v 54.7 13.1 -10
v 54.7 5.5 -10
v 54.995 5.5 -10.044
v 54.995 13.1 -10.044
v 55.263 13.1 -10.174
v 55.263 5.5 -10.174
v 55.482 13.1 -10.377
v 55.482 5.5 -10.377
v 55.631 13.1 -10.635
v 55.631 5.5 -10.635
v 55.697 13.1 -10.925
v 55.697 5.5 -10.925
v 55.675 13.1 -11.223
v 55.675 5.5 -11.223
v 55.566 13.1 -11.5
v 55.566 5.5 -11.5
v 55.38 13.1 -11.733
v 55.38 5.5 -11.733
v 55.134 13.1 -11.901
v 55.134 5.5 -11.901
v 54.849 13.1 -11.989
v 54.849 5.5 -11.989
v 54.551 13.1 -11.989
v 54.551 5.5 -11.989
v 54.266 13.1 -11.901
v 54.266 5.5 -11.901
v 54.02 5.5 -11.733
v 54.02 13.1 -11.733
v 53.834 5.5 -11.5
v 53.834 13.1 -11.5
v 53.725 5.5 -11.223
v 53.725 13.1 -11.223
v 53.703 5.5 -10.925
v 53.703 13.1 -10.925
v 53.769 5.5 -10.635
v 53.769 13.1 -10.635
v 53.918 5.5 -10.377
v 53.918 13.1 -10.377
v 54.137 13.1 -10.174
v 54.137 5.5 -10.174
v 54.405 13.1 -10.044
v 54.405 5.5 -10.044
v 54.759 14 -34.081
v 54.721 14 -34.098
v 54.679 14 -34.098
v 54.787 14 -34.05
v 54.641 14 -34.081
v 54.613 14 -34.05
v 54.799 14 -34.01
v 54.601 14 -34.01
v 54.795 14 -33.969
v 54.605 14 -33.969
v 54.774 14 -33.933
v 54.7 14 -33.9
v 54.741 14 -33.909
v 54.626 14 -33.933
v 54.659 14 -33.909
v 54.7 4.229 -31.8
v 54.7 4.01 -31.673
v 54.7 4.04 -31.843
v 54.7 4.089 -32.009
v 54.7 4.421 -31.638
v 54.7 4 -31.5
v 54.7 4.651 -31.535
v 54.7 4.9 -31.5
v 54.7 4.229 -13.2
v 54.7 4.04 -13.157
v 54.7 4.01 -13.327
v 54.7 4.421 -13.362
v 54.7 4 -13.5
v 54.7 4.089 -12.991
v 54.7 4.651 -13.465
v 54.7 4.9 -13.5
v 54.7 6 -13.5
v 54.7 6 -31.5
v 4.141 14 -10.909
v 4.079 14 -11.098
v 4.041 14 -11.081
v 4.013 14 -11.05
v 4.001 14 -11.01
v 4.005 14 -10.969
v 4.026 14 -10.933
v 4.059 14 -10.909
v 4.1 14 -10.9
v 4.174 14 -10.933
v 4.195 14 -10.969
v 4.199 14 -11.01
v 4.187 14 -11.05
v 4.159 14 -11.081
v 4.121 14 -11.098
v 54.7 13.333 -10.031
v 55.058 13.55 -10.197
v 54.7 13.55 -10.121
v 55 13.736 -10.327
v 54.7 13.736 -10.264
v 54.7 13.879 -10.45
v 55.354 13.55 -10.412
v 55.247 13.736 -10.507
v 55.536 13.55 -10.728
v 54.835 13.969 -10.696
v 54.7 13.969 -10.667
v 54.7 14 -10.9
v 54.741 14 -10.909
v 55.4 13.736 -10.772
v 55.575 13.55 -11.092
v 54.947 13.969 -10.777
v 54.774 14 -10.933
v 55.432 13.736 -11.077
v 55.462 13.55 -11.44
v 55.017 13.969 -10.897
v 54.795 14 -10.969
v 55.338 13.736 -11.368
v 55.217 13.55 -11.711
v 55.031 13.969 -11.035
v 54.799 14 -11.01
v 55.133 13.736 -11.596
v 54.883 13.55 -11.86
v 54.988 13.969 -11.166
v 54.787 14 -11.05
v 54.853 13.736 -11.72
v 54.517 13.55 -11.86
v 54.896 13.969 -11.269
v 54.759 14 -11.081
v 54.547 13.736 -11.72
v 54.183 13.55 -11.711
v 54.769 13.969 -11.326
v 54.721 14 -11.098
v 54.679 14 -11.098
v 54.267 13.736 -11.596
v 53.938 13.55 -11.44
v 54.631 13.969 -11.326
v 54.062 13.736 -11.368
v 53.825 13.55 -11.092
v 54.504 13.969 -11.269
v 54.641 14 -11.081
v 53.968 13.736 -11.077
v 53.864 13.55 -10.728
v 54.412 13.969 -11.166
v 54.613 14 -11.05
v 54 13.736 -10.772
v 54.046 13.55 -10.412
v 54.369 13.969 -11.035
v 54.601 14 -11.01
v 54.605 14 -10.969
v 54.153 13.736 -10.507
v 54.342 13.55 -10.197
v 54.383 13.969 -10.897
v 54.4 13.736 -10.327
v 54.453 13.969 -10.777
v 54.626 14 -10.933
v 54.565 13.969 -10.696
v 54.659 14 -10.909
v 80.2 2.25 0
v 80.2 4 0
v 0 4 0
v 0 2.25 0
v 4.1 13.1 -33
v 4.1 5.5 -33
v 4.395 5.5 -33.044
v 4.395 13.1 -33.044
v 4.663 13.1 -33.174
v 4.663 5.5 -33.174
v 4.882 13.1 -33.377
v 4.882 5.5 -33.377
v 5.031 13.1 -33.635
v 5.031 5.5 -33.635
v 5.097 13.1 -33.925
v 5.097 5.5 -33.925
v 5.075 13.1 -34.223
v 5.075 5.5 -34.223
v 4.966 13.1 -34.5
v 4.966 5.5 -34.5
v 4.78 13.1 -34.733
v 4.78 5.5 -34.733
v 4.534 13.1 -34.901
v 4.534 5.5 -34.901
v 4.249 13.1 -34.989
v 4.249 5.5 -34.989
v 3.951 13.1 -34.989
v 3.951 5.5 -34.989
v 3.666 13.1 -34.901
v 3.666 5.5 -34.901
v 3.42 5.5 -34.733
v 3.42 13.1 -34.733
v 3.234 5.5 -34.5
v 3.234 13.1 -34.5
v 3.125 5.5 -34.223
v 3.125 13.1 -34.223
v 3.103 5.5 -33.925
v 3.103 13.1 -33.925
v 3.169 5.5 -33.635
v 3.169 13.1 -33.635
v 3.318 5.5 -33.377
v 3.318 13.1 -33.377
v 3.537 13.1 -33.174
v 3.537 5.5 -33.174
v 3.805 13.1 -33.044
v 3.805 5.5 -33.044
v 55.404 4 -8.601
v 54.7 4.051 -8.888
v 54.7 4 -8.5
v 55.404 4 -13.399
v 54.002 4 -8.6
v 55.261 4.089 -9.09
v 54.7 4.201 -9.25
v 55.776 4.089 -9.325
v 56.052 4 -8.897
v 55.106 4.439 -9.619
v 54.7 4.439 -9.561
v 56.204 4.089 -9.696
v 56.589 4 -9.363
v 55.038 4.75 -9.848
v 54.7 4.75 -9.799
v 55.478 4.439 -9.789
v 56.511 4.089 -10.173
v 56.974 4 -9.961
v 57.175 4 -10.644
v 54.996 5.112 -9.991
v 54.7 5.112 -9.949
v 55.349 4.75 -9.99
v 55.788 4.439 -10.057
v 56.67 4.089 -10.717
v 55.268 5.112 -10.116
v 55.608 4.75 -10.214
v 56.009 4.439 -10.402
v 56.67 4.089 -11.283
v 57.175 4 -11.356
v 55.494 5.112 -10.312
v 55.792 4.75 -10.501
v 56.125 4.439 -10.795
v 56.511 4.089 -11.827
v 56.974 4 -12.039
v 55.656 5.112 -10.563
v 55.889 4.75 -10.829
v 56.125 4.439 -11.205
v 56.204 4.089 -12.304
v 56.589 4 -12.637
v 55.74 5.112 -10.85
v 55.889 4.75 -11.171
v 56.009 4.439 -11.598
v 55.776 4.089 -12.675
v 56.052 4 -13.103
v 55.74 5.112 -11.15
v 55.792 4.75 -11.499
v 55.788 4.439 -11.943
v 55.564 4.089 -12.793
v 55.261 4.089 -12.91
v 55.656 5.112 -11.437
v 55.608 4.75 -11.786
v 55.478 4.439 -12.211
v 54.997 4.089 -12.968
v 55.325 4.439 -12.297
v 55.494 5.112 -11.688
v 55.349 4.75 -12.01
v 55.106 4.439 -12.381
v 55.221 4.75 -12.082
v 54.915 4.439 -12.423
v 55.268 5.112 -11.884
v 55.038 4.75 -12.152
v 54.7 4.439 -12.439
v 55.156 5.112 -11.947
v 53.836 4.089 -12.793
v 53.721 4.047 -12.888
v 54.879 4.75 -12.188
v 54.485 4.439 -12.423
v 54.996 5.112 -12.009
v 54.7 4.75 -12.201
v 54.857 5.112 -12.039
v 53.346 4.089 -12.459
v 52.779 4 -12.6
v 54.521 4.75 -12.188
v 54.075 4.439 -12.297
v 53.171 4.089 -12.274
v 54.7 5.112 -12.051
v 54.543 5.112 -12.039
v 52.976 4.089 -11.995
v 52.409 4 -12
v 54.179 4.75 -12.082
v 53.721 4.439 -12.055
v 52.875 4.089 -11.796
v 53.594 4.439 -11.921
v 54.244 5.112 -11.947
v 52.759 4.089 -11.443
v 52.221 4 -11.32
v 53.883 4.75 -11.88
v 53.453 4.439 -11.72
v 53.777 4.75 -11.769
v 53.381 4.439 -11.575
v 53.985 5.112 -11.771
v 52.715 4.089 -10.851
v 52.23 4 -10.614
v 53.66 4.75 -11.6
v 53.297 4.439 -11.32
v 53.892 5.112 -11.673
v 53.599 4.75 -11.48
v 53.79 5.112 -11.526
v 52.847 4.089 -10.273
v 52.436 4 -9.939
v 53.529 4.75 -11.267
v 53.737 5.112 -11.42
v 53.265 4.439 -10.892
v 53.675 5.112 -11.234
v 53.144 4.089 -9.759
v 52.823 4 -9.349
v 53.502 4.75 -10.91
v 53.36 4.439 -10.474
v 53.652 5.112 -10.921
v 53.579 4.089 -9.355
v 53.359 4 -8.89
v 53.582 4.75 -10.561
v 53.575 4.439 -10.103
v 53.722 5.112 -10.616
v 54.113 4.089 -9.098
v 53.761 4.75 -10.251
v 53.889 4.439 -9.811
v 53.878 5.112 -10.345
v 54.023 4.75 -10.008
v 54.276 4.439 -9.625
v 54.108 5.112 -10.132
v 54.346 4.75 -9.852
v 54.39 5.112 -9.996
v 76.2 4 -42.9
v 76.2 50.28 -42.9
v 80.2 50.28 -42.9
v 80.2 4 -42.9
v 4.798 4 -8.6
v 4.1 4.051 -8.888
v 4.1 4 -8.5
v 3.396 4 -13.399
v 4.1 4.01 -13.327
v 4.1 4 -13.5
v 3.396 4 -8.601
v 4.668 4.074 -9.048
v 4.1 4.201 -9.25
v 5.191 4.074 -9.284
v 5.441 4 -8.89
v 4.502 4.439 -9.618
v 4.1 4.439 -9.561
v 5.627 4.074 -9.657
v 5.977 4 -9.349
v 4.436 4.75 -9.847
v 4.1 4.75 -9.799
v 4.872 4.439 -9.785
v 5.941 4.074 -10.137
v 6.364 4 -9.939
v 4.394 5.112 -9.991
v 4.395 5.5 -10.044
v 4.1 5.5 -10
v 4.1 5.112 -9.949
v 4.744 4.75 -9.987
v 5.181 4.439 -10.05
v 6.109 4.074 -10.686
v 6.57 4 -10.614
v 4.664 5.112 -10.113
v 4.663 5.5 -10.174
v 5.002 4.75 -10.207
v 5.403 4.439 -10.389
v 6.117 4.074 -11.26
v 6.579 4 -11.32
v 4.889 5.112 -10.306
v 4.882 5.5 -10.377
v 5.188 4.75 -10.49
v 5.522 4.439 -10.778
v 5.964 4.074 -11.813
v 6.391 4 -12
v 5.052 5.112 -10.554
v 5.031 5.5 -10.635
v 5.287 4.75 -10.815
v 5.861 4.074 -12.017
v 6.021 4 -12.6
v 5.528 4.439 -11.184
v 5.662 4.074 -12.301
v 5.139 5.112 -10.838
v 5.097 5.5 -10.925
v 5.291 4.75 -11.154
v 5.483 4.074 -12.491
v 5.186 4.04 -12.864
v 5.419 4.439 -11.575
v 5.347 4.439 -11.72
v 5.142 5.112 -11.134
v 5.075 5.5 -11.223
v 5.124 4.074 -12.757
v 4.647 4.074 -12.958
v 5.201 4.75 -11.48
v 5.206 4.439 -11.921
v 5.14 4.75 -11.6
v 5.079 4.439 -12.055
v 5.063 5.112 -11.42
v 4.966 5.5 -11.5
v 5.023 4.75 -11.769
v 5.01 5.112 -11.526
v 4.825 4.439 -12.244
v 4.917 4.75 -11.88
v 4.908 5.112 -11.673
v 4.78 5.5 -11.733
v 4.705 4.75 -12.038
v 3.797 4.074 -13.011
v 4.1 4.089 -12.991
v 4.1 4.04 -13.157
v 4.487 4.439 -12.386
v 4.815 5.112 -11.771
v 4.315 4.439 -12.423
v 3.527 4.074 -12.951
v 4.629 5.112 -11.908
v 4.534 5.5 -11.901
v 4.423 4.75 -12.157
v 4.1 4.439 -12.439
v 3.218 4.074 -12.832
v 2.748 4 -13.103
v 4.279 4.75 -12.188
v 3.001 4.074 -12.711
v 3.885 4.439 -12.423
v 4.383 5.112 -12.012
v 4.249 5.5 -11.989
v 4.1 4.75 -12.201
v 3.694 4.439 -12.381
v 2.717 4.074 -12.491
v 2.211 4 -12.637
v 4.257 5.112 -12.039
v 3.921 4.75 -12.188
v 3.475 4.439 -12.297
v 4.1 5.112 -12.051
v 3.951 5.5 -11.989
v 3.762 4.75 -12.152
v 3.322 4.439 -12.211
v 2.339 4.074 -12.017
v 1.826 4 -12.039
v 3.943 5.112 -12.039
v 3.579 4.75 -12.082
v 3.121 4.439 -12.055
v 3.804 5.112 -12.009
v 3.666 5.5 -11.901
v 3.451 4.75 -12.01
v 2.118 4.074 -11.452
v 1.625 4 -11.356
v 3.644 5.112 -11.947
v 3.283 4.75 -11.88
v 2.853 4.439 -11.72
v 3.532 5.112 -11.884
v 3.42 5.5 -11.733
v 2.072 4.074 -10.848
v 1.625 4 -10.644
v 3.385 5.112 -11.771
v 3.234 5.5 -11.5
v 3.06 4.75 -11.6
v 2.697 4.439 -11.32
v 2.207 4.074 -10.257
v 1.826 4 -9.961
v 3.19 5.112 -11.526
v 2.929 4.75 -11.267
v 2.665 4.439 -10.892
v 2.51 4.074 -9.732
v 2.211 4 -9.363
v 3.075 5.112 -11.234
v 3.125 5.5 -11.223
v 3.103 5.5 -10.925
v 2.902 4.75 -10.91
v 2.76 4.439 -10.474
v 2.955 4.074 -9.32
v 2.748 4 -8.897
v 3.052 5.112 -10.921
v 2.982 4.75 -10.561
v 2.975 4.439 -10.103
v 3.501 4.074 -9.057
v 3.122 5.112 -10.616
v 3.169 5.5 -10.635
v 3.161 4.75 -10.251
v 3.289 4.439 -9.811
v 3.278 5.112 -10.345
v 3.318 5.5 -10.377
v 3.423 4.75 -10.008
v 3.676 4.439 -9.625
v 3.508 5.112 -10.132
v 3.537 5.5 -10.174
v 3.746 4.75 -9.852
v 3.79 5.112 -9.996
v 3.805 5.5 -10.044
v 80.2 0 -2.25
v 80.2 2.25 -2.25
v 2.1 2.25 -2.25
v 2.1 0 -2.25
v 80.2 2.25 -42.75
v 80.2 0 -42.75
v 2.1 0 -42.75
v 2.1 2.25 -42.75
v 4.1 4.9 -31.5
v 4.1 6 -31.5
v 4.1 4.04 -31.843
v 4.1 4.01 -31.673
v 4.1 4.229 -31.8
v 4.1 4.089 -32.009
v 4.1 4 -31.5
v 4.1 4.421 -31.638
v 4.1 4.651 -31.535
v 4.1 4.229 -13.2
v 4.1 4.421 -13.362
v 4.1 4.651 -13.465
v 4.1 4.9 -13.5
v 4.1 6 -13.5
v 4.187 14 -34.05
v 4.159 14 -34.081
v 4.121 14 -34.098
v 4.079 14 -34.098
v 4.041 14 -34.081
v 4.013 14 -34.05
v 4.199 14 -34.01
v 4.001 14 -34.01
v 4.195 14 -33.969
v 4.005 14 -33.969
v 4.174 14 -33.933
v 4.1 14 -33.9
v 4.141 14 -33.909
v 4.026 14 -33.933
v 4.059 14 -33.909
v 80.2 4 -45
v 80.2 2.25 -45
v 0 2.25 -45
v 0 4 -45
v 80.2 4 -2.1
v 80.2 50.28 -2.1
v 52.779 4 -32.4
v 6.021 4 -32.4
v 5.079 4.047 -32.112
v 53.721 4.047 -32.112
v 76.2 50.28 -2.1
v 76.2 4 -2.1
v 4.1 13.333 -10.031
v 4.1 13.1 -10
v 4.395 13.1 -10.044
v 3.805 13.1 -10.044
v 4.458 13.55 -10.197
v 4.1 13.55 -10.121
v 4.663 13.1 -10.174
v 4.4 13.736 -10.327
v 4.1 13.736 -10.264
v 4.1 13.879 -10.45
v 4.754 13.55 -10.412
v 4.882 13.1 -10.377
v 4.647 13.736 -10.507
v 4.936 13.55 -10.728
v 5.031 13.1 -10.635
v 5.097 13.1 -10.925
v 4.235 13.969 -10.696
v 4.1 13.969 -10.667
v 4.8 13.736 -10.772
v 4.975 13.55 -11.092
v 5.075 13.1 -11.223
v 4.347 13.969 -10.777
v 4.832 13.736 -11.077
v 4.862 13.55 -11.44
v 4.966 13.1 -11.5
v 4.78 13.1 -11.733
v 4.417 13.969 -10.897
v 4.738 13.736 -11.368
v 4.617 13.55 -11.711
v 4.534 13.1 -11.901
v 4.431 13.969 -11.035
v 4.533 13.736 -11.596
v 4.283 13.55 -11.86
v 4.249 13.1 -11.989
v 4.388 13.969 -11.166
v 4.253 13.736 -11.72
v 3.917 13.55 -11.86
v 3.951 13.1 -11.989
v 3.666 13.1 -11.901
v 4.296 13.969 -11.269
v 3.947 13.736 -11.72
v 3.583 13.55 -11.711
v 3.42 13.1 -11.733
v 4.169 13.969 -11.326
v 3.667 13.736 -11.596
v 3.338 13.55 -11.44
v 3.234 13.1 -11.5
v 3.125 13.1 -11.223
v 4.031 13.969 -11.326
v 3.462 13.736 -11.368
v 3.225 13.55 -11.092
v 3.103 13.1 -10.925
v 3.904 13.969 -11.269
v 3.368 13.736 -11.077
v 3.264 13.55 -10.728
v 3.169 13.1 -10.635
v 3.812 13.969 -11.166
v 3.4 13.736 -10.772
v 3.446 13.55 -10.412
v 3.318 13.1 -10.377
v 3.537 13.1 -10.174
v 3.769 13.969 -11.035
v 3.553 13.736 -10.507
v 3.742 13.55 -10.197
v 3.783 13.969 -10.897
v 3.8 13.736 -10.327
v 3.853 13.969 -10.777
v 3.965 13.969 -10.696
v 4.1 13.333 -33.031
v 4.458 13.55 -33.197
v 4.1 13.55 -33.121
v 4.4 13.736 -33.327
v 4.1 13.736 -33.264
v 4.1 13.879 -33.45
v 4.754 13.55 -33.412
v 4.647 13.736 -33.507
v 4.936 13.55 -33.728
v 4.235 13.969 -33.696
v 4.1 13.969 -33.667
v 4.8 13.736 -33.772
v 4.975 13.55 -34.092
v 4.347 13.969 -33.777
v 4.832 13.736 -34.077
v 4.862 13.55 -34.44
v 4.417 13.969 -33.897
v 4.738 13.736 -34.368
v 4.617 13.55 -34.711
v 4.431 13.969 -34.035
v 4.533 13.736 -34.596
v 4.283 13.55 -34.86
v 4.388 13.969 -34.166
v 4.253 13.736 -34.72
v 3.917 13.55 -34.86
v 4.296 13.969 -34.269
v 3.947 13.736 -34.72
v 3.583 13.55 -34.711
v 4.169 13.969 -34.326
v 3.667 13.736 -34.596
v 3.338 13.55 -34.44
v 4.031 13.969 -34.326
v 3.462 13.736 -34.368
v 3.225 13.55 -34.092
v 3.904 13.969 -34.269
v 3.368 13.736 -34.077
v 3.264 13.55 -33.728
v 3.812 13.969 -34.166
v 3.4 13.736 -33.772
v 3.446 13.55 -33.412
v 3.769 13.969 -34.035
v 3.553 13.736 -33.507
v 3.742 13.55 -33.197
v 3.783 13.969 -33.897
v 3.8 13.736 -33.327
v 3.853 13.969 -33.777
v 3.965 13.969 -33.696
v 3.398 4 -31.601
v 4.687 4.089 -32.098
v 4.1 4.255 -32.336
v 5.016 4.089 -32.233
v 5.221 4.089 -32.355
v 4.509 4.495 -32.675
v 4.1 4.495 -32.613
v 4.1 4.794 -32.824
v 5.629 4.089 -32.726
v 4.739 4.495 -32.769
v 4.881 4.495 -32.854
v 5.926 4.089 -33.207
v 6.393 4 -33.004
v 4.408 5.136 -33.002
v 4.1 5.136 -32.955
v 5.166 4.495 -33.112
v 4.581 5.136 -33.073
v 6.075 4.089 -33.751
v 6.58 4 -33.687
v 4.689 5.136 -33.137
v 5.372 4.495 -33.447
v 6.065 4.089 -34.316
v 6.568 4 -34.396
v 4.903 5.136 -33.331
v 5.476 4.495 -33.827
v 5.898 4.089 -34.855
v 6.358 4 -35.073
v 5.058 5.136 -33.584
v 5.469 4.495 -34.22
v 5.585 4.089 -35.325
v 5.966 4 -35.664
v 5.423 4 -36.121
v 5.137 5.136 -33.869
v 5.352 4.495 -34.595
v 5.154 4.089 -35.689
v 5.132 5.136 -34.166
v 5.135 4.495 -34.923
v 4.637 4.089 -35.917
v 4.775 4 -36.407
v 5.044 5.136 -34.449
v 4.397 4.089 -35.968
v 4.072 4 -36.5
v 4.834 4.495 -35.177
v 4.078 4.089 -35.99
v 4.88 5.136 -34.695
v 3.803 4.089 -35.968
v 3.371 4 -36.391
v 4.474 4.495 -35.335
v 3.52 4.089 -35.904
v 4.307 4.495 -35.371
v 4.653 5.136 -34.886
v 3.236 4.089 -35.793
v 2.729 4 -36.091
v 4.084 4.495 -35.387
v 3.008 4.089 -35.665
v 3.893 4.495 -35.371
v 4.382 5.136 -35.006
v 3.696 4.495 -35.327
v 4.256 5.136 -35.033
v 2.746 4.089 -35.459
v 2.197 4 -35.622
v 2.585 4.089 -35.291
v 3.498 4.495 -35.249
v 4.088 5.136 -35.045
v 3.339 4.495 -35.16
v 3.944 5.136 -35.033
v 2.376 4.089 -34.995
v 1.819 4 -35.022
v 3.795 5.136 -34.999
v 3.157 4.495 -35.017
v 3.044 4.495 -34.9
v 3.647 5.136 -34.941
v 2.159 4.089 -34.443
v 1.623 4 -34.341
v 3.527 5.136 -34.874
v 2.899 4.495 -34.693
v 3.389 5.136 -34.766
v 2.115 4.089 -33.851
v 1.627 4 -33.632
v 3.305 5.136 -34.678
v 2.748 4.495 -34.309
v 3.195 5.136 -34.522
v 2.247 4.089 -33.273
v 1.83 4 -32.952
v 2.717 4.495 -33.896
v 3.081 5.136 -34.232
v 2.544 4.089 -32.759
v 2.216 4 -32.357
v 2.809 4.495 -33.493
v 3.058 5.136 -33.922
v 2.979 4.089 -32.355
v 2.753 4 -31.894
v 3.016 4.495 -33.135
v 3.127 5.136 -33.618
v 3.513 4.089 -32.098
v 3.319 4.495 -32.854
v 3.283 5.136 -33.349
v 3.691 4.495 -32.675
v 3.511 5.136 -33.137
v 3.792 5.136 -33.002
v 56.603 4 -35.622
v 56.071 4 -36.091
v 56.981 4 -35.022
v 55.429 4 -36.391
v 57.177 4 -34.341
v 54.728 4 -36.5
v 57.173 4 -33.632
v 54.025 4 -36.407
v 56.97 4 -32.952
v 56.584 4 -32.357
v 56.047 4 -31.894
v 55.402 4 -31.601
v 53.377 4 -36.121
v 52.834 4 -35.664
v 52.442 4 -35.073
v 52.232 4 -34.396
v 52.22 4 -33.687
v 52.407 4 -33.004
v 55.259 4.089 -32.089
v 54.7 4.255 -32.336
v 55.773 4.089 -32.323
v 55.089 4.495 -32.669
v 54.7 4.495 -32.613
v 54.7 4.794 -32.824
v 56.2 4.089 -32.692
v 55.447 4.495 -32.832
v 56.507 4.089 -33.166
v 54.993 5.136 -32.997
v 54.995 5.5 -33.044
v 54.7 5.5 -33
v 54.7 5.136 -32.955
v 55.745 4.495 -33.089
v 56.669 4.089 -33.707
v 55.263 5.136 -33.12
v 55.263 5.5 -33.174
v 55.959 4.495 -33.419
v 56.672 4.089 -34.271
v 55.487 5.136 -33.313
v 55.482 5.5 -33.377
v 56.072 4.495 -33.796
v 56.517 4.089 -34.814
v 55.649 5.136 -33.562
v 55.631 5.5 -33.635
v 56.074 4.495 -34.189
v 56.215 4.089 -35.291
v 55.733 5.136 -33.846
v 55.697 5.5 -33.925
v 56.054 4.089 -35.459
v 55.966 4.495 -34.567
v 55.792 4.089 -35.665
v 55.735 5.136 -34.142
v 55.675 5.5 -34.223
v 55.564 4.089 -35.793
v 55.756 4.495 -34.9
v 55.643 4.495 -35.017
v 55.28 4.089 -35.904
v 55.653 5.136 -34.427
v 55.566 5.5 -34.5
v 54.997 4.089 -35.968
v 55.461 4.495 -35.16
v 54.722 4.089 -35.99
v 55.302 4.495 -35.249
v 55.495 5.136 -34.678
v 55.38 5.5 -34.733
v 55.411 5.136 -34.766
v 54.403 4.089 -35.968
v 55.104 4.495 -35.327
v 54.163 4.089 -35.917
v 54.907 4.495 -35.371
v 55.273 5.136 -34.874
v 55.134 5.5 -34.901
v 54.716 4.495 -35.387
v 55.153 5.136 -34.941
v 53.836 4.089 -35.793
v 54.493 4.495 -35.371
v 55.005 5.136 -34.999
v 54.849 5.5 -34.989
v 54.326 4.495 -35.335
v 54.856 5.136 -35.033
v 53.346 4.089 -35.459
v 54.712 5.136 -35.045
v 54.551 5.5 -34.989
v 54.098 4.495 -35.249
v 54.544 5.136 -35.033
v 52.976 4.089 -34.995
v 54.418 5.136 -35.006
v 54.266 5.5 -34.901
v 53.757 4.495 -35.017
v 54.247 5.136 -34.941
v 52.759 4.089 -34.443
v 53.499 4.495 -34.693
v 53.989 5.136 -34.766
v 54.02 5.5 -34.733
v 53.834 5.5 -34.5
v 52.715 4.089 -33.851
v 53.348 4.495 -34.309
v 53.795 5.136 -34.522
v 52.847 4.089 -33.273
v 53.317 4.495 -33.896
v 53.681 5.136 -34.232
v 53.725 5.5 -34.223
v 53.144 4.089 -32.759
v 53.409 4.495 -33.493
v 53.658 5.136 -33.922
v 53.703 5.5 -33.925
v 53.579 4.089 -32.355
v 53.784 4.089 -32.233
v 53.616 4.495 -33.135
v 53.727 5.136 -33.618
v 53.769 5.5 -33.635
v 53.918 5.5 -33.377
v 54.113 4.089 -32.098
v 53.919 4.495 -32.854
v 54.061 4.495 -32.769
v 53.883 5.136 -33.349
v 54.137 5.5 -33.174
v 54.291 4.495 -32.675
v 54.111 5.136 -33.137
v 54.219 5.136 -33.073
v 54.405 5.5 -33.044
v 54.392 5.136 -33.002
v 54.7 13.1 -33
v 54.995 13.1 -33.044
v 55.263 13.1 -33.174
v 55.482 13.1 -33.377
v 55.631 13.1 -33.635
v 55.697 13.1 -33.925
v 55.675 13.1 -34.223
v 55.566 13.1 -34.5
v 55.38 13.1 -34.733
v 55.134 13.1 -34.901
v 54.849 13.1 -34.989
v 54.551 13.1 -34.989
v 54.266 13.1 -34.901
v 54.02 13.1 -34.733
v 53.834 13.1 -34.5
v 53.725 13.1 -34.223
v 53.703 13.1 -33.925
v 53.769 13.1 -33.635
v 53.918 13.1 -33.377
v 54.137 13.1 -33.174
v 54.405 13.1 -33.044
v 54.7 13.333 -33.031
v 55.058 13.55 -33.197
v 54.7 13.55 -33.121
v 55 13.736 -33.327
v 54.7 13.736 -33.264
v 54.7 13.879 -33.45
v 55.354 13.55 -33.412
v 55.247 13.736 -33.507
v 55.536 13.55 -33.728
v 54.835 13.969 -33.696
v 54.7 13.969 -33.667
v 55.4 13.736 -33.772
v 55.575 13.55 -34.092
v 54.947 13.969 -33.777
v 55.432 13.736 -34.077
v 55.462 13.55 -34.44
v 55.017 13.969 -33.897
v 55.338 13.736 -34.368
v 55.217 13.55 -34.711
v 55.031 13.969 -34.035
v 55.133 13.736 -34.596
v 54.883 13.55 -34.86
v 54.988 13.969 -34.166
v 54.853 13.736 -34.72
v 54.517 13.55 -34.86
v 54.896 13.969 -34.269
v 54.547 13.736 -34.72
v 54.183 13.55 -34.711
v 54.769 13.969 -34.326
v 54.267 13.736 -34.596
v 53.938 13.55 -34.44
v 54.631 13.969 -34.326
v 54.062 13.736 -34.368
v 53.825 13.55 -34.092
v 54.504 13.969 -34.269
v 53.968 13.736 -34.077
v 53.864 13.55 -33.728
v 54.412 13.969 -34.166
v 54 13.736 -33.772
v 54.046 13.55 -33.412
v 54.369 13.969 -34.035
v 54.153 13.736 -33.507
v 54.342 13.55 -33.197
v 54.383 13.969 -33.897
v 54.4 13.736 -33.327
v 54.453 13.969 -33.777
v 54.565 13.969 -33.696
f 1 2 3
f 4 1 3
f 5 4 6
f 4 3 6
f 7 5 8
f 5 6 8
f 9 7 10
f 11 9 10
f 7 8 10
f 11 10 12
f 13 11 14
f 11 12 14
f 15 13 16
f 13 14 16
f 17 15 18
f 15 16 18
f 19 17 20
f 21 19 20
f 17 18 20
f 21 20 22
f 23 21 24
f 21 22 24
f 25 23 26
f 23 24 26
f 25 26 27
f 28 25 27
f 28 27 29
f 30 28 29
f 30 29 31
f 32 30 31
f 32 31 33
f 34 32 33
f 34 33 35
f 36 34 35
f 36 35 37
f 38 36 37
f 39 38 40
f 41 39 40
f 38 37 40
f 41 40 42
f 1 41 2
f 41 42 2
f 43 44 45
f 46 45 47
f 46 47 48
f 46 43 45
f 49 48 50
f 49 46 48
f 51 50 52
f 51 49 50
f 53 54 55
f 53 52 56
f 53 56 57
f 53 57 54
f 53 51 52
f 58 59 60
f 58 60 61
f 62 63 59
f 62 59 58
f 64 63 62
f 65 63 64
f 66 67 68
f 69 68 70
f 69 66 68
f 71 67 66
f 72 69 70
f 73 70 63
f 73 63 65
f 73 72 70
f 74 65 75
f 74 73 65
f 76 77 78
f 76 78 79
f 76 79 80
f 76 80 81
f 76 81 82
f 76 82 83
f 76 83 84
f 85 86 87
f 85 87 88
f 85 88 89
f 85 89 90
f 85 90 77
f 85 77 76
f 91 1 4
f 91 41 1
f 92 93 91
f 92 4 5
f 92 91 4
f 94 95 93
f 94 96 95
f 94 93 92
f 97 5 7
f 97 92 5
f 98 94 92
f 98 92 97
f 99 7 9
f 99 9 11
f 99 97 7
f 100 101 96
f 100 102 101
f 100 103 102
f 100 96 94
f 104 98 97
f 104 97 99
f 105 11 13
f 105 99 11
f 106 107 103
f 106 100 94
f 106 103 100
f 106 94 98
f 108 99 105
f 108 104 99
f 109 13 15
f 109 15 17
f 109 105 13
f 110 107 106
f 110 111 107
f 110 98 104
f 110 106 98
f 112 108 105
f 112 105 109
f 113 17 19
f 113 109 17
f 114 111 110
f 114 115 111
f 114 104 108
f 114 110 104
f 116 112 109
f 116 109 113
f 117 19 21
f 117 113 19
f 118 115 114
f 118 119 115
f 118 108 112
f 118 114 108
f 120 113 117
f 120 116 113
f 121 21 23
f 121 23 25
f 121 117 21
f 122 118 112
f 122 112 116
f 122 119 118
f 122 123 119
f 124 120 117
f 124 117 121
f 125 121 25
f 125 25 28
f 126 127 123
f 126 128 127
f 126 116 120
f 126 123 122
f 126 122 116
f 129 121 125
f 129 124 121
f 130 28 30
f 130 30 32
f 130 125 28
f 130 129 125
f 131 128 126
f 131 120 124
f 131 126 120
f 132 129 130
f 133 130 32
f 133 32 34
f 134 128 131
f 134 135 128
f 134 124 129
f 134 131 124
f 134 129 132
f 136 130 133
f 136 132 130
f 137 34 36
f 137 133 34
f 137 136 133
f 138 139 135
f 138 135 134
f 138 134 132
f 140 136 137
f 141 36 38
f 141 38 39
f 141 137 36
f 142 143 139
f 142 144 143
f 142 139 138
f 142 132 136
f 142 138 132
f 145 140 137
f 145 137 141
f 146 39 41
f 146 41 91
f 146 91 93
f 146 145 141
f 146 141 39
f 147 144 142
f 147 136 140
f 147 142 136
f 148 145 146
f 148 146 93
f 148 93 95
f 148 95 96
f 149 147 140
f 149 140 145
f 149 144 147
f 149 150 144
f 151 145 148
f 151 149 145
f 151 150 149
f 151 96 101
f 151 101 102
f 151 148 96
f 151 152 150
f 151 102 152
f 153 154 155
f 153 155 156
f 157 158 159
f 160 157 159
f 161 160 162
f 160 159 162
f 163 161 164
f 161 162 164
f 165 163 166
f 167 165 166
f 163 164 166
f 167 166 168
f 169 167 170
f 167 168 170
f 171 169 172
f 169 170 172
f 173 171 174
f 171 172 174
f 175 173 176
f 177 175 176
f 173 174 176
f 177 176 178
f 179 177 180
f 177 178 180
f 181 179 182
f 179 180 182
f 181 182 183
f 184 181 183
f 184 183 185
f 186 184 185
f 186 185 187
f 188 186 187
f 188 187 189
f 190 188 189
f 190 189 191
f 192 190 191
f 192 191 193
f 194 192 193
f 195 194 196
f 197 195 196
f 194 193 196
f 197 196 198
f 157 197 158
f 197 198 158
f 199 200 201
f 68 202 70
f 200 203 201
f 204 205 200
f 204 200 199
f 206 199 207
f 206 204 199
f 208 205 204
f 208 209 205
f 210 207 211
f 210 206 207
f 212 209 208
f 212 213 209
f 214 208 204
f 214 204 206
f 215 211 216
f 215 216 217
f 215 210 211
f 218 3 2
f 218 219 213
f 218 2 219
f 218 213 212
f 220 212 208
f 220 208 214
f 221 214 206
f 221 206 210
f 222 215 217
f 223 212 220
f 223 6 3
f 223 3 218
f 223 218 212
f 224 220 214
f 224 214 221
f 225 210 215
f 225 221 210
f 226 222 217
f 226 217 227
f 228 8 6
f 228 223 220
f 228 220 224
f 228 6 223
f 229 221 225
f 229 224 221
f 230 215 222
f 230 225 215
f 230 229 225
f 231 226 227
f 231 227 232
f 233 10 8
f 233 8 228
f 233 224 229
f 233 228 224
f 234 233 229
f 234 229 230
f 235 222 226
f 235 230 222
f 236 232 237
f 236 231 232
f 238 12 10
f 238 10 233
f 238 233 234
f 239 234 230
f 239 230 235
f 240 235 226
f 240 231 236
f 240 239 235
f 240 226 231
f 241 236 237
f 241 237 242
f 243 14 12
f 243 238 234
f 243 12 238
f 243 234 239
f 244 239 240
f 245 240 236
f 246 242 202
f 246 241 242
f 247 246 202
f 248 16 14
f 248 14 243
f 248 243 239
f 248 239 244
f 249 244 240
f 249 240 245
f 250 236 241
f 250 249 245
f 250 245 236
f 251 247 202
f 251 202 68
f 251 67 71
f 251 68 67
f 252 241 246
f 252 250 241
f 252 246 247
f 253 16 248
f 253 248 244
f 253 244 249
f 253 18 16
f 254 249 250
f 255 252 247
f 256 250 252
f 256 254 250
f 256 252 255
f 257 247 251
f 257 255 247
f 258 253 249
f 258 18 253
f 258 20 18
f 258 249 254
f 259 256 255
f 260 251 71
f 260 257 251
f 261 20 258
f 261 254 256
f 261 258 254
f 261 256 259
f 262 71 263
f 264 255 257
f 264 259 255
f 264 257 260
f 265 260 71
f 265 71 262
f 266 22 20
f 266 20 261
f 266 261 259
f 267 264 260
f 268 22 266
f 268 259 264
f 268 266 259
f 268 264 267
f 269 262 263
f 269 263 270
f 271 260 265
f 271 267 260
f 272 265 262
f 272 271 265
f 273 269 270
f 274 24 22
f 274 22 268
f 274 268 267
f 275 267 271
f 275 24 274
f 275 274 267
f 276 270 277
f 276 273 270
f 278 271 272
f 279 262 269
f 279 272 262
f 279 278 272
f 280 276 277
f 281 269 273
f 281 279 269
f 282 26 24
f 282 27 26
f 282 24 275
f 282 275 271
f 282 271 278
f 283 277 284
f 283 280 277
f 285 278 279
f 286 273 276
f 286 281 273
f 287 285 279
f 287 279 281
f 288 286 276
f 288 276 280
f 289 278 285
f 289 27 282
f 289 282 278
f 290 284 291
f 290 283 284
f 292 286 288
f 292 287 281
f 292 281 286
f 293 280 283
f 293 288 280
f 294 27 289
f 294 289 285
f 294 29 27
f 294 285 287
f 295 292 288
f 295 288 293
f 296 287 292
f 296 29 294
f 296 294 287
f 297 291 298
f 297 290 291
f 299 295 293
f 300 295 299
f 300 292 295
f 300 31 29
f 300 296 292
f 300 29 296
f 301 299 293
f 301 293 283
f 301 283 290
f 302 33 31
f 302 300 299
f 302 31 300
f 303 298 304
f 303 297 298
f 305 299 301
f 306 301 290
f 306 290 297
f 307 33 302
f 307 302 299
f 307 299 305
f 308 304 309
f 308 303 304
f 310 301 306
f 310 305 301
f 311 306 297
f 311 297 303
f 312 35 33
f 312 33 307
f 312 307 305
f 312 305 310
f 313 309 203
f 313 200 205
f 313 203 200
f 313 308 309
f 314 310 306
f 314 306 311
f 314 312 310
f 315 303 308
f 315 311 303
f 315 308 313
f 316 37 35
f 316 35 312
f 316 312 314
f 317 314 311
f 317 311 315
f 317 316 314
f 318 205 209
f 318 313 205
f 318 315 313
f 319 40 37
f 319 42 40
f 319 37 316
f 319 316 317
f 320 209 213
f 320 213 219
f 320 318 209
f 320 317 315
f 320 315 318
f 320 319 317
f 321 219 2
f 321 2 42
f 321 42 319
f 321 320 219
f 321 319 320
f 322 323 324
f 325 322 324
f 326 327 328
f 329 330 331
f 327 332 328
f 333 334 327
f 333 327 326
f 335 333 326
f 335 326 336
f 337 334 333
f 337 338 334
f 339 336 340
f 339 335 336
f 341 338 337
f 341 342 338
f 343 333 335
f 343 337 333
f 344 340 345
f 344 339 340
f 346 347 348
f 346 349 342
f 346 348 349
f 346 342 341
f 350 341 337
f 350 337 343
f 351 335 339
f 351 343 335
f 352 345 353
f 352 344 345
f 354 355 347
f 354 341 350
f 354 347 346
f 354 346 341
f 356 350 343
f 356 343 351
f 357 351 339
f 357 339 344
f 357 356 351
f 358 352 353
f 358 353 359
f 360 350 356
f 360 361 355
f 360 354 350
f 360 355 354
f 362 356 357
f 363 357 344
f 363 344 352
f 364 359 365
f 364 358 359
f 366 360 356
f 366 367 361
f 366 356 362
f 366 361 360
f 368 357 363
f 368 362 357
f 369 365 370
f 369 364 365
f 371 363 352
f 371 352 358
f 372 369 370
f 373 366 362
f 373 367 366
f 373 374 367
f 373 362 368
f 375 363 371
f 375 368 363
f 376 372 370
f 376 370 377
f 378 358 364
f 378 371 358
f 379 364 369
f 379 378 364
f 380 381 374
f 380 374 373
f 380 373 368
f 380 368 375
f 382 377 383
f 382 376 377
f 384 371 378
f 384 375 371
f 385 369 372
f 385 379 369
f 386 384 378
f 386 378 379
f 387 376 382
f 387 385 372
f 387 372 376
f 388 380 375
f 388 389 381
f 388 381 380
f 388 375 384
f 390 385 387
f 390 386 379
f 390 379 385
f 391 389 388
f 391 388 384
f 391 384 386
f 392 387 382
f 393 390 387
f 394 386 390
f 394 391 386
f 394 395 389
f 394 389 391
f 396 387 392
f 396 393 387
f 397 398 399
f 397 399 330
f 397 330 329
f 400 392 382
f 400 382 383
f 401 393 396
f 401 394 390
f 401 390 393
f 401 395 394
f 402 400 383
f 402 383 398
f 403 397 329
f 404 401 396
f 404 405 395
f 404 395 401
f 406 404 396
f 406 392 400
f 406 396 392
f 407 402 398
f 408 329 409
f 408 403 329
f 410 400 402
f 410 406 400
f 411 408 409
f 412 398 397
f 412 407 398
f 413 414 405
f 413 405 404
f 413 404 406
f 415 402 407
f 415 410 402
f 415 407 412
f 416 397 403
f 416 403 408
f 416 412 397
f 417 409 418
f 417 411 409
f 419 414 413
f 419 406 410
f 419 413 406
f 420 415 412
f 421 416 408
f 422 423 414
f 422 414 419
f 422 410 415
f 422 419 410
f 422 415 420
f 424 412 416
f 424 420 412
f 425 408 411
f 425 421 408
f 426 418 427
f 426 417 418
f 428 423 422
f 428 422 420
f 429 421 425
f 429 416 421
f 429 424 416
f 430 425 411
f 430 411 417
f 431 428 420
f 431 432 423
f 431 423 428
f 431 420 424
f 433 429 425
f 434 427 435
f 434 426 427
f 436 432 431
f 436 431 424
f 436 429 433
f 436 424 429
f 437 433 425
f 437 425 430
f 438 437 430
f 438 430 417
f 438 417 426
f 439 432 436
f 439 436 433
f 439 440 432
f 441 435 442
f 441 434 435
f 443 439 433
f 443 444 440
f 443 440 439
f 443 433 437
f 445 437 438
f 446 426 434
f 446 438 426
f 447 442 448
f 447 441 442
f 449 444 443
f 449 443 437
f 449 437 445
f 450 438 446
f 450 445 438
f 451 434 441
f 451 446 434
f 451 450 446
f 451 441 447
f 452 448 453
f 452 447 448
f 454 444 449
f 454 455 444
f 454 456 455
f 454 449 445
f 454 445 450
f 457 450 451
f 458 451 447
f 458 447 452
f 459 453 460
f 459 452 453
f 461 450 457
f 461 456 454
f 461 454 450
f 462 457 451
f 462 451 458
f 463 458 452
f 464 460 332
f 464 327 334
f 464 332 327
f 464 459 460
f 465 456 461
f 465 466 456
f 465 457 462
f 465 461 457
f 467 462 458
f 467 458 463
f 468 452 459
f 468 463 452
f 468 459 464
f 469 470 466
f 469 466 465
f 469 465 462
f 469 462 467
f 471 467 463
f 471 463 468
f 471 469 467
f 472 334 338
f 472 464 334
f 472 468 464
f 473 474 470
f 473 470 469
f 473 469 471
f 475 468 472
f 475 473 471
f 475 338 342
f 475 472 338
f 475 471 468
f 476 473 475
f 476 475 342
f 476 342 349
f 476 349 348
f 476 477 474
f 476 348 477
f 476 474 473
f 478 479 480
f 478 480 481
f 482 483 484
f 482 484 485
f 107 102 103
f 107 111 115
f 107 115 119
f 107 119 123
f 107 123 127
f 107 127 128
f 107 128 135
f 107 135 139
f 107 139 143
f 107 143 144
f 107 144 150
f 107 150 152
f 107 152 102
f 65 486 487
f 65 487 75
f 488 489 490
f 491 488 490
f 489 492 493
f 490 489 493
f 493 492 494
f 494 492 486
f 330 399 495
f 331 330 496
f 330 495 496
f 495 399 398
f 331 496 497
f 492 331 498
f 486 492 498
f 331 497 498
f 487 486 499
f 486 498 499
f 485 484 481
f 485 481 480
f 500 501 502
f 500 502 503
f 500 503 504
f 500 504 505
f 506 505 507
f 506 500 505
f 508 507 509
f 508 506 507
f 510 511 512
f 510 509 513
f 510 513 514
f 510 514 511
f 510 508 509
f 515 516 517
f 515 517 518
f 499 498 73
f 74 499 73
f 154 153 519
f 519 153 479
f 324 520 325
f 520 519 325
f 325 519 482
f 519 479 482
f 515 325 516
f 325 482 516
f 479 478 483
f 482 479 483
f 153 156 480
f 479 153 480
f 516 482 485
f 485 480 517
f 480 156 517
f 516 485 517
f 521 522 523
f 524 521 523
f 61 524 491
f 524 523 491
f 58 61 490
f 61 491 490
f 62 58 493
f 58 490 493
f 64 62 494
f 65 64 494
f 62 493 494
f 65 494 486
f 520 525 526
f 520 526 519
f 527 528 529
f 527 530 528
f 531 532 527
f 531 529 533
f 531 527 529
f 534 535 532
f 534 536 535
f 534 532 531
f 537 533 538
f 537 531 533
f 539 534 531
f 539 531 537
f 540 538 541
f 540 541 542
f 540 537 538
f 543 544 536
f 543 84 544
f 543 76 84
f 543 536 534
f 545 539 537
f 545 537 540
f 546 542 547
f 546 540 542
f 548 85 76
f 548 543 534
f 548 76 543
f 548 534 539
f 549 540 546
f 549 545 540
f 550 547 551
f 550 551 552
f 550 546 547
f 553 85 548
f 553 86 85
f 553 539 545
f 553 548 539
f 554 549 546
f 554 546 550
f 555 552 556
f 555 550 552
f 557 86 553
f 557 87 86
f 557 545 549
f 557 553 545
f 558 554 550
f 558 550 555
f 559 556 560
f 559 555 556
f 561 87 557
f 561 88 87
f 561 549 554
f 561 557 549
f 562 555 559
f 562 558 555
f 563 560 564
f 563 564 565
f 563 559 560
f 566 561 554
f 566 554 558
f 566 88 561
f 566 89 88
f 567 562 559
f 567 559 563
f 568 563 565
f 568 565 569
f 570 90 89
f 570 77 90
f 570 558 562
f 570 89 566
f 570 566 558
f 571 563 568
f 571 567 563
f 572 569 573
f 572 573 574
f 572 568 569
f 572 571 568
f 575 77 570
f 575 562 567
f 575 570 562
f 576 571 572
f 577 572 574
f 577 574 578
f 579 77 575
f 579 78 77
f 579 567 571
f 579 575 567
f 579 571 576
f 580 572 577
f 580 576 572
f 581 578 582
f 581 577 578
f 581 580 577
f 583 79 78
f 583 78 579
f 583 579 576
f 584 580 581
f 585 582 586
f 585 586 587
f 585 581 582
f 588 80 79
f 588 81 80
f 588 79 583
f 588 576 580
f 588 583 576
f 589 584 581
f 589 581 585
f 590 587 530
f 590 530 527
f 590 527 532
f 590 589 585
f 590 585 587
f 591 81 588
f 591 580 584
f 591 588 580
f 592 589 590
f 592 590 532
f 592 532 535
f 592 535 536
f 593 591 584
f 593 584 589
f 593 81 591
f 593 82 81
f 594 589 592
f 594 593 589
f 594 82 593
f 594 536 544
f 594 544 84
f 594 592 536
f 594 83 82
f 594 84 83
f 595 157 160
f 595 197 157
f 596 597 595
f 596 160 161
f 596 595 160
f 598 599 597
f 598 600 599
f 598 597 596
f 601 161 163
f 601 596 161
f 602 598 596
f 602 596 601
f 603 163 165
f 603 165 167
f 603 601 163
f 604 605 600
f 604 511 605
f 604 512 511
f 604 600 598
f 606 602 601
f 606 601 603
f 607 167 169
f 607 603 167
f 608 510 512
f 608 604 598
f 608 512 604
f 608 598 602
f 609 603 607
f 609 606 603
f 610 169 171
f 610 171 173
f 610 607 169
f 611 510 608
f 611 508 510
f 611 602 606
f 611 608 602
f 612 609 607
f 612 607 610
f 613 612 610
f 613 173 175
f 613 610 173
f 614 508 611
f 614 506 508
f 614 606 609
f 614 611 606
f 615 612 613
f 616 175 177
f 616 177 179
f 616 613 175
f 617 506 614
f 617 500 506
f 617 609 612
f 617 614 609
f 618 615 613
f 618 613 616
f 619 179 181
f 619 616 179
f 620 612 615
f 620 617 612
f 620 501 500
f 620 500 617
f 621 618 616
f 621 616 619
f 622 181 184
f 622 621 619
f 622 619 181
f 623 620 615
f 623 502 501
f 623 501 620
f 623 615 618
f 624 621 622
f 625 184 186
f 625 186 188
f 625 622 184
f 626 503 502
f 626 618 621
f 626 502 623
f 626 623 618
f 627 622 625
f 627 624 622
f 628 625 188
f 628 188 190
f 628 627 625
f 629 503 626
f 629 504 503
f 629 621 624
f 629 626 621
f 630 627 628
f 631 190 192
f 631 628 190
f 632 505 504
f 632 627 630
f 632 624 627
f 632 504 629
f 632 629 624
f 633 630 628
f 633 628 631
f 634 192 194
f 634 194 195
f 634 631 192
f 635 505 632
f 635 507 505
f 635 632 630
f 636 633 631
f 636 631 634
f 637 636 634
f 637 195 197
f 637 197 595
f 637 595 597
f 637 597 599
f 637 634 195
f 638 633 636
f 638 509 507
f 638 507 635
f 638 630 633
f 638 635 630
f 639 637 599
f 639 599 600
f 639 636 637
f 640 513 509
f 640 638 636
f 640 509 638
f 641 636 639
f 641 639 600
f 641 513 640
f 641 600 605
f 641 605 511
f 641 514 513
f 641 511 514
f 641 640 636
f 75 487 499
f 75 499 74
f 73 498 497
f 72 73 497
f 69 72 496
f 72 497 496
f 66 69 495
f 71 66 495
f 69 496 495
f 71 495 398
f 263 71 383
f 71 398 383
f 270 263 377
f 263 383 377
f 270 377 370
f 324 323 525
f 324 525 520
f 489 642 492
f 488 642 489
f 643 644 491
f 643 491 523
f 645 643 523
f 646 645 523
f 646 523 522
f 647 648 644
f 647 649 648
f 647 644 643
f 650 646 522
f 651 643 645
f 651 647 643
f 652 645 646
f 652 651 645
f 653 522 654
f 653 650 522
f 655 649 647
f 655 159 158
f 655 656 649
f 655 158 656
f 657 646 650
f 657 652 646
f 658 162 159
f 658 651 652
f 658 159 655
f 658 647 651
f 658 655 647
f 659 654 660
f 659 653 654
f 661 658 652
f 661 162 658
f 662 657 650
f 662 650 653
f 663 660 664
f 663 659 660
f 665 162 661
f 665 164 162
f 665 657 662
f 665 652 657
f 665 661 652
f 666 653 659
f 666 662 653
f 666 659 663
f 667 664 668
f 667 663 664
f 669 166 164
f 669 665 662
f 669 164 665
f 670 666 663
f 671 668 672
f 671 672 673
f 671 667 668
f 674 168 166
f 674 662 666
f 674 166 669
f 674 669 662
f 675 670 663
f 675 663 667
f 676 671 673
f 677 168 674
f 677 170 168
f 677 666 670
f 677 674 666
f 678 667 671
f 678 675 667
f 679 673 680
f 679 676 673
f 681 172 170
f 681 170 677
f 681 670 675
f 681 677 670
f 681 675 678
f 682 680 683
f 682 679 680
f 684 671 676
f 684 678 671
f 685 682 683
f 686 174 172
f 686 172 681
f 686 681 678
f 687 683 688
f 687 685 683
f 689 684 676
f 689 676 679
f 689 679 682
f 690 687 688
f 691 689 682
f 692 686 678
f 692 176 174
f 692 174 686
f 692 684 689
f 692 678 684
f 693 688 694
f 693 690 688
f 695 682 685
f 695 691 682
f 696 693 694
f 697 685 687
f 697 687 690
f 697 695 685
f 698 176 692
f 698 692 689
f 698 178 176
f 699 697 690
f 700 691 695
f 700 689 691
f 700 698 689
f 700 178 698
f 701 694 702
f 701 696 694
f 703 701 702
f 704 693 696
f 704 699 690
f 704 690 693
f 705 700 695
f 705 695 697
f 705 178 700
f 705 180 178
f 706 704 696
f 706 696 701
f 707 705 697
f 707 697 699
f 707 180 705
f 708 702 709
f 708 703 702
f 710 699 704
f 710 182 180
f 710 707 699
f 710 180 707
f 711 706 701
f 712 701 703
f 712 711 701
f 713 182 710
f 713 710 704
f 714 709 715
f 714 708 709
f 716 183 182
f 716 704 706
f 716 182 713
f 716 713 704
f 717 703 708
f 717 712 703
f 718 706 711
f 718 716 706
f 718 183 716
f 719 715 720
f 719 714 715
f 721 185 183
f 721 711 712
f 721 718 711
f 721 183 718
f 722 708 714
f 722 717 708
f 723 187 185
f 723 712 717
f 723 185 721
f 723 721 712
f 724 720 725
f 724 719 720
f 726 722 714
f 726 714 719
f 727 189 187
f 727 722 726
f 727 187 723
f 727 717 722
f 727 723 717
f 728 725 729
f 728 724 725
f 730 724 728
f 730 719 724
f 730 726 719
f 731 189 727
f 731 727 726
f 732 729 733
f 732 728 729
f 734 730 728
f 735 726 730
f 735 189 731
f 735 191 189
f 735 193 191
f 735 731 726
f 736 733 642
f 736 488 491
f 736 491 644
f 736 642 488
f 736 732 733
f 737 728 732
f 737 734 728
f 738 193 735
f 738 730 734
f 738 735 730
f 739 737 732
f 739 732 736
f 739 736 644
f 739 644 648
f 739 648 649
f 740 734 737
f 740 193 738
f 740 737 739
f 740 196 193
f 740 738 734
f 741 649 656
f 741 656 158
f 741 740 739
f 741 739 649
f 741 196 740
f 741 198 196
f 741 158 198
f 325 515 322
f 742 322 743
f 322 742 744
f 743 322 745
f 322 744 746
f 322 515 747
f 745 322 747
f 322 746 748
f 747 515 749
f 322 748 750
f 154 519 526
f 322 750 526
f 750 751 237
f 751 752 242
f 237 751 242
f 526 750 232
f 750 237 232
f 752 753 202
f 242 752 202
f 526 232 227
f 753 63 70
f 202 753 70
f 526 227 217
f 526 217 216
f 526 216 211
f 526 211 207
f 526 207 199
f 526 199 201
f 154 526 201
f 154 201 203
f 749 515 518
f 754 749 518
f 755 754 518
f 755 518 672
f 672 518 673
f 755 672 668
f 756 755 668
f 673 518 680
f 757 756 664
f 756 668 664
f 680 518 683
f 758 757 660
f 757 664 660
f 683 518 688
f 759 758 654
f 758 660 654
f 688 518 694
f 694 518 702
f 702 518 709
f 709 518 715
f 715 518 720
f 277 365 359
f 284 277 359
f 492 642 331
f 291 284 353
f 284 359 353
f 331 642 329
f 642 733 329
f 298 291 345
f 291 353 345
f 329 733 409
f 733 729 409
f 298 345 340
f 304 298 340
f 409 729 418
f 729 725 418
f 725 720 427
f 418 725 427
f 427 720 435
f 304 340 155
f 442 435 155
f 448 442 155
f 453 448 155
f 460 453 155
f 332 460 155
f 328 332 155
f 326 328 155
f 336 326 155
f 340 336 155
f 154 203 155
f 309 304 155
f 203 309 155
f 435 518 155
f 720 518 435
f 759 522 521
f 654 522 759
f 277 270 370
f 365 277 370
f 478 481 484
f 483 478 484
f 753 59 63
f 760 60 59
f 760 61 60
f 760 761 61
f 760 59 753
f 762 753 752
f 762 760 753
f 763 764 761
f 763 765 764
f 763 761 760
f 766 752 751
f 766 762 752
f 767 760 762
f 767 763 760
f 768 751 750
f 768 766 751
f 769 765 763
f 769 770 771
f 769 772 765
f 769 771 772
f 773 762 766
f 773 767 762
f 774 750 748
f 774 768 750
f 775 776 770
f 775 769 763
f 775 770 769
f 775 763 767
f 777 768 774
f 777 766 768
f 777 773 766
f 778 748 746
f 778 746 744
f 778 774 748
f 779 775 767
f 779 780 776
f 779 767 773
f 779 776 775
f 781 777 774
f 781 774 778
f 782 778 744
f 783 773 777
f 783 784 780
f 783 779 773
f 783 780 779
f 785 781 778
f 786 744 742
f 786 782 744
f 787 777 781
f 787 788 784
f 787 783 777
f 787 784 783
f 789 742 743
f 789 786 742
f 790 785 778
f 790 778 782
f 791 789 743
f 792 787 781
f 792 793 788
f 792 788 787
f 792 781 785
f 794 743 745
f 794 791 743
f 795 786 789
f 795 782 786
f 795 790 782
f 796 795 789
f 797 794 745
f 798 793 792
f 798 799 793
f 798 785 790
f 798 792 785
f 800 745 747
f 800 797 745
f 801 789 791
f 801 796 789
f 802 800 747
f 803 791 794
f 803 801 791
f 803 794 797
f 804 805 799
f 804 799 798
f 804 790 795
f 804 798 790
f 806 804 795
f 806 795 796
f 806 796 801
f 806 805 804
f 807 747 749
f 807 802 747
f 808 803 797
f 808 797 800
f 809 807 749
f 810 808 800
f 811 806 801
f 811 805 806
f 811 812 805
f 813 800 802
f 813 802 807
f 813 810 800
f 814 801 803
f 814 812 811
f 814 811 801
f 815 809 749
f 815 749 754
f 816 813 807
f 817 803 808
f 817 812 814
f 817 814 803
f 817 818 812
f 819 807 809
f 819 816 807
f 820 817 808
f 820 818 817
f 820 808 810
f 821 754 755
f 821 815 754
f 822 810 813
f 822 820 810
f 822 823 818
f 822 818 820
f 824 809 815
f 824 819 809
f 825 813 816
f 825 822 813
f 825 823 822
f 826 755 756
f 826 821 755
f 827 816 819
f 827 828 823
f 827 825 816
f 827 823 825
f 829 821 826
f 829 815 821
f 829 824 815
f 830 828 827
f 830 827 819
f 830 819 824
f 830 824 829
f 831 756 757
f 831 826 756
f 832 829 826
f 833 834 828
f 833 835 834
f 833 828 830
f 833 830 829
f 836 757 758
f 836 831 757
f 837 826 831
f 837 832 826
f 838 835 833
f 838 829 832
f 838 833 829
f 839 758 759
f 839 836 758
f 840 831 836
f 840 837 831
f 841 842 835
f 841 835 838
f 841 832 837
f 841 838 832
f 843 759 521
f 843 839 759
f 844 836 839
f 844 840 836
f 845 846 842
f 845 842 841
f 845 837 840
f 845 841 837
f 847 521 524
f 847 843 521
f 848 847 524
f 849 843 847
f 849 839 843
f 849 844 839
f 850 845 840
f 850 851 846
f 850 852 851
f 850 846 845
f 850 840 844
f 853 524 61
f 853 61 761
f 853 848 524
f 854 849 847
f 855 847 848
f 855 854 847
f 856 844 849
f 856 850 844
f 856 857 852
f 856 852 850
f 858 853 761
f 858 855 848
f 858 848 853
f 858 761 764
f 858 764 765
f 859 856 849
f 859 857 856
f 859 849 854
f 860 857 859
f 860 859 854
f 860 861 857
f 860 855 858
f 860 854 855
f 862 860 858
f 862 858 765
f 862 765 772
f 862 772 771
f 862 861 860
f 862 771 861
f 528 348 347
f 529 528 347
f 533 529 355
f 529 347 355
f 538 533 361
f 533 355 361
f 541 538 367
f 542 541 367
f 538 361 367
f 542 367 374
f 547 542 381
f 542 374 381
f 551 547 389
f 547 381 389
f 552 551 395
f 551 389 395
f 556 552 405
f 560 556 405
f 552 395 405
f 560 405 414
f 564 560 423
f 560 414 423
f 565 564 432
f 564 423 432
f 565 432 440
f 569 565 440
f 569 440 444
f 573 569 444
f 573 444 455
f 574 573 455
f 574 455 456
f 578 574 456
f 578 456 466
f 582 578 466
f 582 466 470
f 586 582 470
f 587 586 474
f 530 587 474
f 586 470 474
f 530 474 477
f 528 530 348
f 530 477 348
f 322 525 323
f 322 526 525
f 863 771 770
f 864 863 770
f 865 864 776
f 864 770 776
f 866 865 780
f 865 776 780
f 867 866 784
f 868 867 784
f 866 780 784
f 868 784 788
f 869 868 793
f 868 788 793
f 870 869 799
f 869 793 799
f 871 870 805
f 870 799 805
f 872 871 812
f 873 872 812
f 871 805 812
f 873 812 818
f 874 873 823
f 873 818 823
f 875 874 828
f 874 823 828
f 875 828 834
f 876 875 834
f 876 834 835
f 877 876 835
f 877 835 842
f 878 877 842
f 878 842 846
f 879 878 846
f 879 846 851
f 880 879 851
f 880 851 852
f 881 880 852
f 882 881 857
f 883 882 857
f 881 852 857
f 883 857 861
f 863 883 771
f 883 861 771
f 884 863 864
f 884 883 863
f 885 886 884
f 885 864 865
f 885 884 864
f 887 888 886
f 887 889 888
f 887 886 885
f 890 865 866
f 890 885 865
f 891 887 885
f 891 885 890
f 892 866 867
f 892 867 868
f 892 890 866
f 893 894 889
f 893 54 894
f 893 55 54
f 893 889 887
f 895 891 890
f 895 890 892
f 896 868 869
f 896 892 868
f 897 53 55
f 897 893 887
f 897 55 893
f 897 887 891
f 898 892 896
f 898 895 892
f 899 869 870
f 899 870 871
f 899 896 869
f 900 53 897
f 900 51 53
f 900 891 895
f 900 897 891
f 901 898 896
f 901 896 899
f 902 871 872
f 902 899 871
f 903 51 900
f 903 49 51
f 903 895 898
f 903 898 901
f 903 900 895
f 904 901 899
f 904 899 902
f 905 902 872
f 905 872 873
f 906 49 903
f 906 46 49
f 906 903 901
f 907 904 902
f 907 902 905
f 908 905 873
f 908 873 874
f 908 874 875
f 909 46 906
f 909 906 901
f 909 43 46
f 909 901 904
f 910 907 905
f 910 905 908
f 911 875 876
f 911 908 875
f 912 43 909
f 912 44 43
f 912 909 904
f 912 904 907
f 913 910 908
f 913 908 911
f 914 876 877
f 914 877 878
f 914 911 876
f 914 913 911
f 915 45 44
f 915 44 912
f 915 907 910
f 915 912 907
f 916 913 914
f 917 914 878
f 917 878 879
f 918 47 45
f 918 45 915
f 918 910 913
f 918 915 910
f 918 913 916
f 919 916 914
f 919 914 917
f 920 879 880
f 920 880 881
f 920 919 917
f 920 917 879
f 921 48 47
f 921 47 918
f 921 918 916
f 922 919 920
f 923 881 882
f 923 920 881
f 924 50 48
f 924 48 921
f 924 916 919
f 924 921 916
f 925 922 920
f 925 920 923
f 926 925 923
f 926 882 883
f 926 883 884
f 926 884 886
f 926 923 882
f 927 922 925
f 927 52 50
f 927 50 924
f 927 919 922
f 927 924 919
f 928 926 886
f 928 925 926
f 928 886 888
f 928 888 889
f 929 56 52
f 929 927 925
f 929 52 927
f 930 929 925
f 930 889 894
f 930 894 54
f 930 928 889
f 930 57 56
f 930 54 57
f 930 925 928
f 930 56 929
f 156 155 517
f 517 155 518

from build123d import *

# Parameters (mm, degrees)
BOSS_EXTRU_4_DEPTH           = 80.2
ENL_V_MAT_EXTRU_5_DEPTH      = 91.970338573
ENL_V_MAT_EXTRU_5_DEPTH_BACK = 91.970338573
ESQUISSE10_W                 = 2.1
ESQUISSE10_H                 = 2.25
ESQUISSE11_W                 = 40.8
ESQUISSE11_H                 = 45.5
BOSS_EXTRU_5_DEPTH           = 4
ESQUISSE12_W                 = 4
ESQUISSE12_H                 = 40.8
BOSS_EXTRU_6_DEPTH           = 0.78
ESQUISSE13_R                 = 1
BOSS_EXTRU_7_DEPTH           = 10
CONG_1_R                     = 1.5
CONG_5_R                     = 0.9
ESQUISSE14_W                 = 50.6
ESQUISSE14_H                 = 18
BOSS_EXTRU_8_DEPTH           = 2
CONG_7_START                 = 4.1
CONG_7_DEPTH                 = 50.6


with BuildPart() as part:
    # Esquisse9 → Boss.-Extru.4 (new body)
    with BuildSketch(Plane(origin=(0, 0, 0), x_dir=(0, 0, -1), z_dir=(1, 0, 0))):
        Polygon((2.25, 2.25), (2.25, 0), (42.75, 0), (42.75, 2.25), (45, 2.25), (45, 4), (0, 4), (0, 2.25), align=None)
    extrude(amount=BOSS_EXTRU_4_DEPTH)

    # Esquisse10 → Enlèv. mat.-Extru.5 (cut, two sides: drawn at the far end of the back side and taken through both)
    with BuildSketch(Plane.XY.offset(-2.25).offset(-ENL_V_MAT_EXTRU_5_DEPTH_BACK)):
        with Locations((1.05, 1.125)):
            Rectangle(ESQUISSE10_W, ESQUISSE10_H)
    extrude(amount=ENL_V_MAT_EXTRU_5_DEPTH + ENL_V_MAT_EXTRU_5_DEPTH_BACK, mode=Mode.SUBTRACT)

    # Esquisse11 → Boss.-Extru.5 (add)
    with BuildSketch(Plane(origin=(80.2, 0, 0), x_dir=(0, 0, -1), z_dir=(1, 0, 0))):
        with Locations((22.5, 26.75)):
            Rectangle(ESQUISSE11_W, ESQUISSE11_H)
    extrude(amount=-BOSS_EXTRU_5_DEPTH)

    # Esquisse12 → Boss.-Extru.6 (add)
    with BuildSketch(Plane(origin=(0, 49.5, 0), x_dir=(1, 0, 0), z_dir=(0, 1, 0))):
        with Locations((78.2, 22.5)):
            Rectangle(ESQUISSE12_W, ESQUISSE12_H)
    extrude(amount=BOSS_EXTRU_6_DEPTH)

    # Esquisse13 → Boss.-Extru.7 (add)
    with BuildSketch(Plane(origin=(0, 4, 0), x_dir=(1, 0, 0), z_dir=(0, 1, 0))):
        with Locations(Location((4.1, 34, 0), (0, 0, 270))):
            Circle(ESQUISSE13_R)
        with Locations(Location((4.1, 11, 0), (0, 0, 270))):
            Circle(ESQUISSE13_R)
        with Locations(Location((54.7, 11, 0), (0, 0, 270))):
            Circle(ESQUISSE13_R)
        with Locations(Location((54.7, 34, 0), (0, 0, 270))):
            Circle(ESQUISSE13_R)
    extrude(amount=BOSS_EXTRU_7_DEPTH)

    # Congé1
    cong_1_edges = [part.edges().sort_by_distance(p)[0] for p in [
        (54.7, 4, -35),
        (54.7, 4, -12),
        (4.1, 4, -12),
        (4.1, 4, -35),
    ]]
    fillet(cong_1_edges, radius=CONG_1_R)

    # Congé5
    cong_5_edges = [part.edges().sort_by_distance(p)[0] for p in [
        (54.7, 14, -35),
        (54.7, 14, -12),
        (4.1, 14, -12),
        (4.1, 14, -35),
    ]]
    fillet(cong_5_edges, radius=CONG_5_R)

    # Esquisse14 → Boss.-Extru.8 (add)
    with BuildSketch(Plane(origin=(0, 4, 0), x_dir=(1, 0, 0), z_dir=(0, 1, 0))):
        with Locations((29.4, 22.5)):
            Rectangle(ESQUISSE14_W, ESQUISSE14_H)
    extrude(amount=BOSS_EXTRU_8_DEPTH)

    # Congé7: read off the stored shape, not the designer's step
    # Congé7 outline → Congé7 (add)
    with BuildSketch(Plane.YZ.offset(CONG_7_START)):
        with BuildLine():
            Line((4, -31.5), (4, -32.4))
            ThreePointArc((4, -32.4), (4.263603897, -31.763603897), (4.9, -31.5))
            Line((4.9, -31.5), (4, -31.5))
        make_face()
        with BuildLine():
            Line((4, -12.6), (4, -13.5))
            Line((4, -13.5), (4.9, -13.5))
            ThreePointArc((4.9, -13.5), (4.263603897, -13.236396103), (4, -12.6))
        make_face()
    extrude(amount=CONG_7_DEPTH)


solid = part.part
